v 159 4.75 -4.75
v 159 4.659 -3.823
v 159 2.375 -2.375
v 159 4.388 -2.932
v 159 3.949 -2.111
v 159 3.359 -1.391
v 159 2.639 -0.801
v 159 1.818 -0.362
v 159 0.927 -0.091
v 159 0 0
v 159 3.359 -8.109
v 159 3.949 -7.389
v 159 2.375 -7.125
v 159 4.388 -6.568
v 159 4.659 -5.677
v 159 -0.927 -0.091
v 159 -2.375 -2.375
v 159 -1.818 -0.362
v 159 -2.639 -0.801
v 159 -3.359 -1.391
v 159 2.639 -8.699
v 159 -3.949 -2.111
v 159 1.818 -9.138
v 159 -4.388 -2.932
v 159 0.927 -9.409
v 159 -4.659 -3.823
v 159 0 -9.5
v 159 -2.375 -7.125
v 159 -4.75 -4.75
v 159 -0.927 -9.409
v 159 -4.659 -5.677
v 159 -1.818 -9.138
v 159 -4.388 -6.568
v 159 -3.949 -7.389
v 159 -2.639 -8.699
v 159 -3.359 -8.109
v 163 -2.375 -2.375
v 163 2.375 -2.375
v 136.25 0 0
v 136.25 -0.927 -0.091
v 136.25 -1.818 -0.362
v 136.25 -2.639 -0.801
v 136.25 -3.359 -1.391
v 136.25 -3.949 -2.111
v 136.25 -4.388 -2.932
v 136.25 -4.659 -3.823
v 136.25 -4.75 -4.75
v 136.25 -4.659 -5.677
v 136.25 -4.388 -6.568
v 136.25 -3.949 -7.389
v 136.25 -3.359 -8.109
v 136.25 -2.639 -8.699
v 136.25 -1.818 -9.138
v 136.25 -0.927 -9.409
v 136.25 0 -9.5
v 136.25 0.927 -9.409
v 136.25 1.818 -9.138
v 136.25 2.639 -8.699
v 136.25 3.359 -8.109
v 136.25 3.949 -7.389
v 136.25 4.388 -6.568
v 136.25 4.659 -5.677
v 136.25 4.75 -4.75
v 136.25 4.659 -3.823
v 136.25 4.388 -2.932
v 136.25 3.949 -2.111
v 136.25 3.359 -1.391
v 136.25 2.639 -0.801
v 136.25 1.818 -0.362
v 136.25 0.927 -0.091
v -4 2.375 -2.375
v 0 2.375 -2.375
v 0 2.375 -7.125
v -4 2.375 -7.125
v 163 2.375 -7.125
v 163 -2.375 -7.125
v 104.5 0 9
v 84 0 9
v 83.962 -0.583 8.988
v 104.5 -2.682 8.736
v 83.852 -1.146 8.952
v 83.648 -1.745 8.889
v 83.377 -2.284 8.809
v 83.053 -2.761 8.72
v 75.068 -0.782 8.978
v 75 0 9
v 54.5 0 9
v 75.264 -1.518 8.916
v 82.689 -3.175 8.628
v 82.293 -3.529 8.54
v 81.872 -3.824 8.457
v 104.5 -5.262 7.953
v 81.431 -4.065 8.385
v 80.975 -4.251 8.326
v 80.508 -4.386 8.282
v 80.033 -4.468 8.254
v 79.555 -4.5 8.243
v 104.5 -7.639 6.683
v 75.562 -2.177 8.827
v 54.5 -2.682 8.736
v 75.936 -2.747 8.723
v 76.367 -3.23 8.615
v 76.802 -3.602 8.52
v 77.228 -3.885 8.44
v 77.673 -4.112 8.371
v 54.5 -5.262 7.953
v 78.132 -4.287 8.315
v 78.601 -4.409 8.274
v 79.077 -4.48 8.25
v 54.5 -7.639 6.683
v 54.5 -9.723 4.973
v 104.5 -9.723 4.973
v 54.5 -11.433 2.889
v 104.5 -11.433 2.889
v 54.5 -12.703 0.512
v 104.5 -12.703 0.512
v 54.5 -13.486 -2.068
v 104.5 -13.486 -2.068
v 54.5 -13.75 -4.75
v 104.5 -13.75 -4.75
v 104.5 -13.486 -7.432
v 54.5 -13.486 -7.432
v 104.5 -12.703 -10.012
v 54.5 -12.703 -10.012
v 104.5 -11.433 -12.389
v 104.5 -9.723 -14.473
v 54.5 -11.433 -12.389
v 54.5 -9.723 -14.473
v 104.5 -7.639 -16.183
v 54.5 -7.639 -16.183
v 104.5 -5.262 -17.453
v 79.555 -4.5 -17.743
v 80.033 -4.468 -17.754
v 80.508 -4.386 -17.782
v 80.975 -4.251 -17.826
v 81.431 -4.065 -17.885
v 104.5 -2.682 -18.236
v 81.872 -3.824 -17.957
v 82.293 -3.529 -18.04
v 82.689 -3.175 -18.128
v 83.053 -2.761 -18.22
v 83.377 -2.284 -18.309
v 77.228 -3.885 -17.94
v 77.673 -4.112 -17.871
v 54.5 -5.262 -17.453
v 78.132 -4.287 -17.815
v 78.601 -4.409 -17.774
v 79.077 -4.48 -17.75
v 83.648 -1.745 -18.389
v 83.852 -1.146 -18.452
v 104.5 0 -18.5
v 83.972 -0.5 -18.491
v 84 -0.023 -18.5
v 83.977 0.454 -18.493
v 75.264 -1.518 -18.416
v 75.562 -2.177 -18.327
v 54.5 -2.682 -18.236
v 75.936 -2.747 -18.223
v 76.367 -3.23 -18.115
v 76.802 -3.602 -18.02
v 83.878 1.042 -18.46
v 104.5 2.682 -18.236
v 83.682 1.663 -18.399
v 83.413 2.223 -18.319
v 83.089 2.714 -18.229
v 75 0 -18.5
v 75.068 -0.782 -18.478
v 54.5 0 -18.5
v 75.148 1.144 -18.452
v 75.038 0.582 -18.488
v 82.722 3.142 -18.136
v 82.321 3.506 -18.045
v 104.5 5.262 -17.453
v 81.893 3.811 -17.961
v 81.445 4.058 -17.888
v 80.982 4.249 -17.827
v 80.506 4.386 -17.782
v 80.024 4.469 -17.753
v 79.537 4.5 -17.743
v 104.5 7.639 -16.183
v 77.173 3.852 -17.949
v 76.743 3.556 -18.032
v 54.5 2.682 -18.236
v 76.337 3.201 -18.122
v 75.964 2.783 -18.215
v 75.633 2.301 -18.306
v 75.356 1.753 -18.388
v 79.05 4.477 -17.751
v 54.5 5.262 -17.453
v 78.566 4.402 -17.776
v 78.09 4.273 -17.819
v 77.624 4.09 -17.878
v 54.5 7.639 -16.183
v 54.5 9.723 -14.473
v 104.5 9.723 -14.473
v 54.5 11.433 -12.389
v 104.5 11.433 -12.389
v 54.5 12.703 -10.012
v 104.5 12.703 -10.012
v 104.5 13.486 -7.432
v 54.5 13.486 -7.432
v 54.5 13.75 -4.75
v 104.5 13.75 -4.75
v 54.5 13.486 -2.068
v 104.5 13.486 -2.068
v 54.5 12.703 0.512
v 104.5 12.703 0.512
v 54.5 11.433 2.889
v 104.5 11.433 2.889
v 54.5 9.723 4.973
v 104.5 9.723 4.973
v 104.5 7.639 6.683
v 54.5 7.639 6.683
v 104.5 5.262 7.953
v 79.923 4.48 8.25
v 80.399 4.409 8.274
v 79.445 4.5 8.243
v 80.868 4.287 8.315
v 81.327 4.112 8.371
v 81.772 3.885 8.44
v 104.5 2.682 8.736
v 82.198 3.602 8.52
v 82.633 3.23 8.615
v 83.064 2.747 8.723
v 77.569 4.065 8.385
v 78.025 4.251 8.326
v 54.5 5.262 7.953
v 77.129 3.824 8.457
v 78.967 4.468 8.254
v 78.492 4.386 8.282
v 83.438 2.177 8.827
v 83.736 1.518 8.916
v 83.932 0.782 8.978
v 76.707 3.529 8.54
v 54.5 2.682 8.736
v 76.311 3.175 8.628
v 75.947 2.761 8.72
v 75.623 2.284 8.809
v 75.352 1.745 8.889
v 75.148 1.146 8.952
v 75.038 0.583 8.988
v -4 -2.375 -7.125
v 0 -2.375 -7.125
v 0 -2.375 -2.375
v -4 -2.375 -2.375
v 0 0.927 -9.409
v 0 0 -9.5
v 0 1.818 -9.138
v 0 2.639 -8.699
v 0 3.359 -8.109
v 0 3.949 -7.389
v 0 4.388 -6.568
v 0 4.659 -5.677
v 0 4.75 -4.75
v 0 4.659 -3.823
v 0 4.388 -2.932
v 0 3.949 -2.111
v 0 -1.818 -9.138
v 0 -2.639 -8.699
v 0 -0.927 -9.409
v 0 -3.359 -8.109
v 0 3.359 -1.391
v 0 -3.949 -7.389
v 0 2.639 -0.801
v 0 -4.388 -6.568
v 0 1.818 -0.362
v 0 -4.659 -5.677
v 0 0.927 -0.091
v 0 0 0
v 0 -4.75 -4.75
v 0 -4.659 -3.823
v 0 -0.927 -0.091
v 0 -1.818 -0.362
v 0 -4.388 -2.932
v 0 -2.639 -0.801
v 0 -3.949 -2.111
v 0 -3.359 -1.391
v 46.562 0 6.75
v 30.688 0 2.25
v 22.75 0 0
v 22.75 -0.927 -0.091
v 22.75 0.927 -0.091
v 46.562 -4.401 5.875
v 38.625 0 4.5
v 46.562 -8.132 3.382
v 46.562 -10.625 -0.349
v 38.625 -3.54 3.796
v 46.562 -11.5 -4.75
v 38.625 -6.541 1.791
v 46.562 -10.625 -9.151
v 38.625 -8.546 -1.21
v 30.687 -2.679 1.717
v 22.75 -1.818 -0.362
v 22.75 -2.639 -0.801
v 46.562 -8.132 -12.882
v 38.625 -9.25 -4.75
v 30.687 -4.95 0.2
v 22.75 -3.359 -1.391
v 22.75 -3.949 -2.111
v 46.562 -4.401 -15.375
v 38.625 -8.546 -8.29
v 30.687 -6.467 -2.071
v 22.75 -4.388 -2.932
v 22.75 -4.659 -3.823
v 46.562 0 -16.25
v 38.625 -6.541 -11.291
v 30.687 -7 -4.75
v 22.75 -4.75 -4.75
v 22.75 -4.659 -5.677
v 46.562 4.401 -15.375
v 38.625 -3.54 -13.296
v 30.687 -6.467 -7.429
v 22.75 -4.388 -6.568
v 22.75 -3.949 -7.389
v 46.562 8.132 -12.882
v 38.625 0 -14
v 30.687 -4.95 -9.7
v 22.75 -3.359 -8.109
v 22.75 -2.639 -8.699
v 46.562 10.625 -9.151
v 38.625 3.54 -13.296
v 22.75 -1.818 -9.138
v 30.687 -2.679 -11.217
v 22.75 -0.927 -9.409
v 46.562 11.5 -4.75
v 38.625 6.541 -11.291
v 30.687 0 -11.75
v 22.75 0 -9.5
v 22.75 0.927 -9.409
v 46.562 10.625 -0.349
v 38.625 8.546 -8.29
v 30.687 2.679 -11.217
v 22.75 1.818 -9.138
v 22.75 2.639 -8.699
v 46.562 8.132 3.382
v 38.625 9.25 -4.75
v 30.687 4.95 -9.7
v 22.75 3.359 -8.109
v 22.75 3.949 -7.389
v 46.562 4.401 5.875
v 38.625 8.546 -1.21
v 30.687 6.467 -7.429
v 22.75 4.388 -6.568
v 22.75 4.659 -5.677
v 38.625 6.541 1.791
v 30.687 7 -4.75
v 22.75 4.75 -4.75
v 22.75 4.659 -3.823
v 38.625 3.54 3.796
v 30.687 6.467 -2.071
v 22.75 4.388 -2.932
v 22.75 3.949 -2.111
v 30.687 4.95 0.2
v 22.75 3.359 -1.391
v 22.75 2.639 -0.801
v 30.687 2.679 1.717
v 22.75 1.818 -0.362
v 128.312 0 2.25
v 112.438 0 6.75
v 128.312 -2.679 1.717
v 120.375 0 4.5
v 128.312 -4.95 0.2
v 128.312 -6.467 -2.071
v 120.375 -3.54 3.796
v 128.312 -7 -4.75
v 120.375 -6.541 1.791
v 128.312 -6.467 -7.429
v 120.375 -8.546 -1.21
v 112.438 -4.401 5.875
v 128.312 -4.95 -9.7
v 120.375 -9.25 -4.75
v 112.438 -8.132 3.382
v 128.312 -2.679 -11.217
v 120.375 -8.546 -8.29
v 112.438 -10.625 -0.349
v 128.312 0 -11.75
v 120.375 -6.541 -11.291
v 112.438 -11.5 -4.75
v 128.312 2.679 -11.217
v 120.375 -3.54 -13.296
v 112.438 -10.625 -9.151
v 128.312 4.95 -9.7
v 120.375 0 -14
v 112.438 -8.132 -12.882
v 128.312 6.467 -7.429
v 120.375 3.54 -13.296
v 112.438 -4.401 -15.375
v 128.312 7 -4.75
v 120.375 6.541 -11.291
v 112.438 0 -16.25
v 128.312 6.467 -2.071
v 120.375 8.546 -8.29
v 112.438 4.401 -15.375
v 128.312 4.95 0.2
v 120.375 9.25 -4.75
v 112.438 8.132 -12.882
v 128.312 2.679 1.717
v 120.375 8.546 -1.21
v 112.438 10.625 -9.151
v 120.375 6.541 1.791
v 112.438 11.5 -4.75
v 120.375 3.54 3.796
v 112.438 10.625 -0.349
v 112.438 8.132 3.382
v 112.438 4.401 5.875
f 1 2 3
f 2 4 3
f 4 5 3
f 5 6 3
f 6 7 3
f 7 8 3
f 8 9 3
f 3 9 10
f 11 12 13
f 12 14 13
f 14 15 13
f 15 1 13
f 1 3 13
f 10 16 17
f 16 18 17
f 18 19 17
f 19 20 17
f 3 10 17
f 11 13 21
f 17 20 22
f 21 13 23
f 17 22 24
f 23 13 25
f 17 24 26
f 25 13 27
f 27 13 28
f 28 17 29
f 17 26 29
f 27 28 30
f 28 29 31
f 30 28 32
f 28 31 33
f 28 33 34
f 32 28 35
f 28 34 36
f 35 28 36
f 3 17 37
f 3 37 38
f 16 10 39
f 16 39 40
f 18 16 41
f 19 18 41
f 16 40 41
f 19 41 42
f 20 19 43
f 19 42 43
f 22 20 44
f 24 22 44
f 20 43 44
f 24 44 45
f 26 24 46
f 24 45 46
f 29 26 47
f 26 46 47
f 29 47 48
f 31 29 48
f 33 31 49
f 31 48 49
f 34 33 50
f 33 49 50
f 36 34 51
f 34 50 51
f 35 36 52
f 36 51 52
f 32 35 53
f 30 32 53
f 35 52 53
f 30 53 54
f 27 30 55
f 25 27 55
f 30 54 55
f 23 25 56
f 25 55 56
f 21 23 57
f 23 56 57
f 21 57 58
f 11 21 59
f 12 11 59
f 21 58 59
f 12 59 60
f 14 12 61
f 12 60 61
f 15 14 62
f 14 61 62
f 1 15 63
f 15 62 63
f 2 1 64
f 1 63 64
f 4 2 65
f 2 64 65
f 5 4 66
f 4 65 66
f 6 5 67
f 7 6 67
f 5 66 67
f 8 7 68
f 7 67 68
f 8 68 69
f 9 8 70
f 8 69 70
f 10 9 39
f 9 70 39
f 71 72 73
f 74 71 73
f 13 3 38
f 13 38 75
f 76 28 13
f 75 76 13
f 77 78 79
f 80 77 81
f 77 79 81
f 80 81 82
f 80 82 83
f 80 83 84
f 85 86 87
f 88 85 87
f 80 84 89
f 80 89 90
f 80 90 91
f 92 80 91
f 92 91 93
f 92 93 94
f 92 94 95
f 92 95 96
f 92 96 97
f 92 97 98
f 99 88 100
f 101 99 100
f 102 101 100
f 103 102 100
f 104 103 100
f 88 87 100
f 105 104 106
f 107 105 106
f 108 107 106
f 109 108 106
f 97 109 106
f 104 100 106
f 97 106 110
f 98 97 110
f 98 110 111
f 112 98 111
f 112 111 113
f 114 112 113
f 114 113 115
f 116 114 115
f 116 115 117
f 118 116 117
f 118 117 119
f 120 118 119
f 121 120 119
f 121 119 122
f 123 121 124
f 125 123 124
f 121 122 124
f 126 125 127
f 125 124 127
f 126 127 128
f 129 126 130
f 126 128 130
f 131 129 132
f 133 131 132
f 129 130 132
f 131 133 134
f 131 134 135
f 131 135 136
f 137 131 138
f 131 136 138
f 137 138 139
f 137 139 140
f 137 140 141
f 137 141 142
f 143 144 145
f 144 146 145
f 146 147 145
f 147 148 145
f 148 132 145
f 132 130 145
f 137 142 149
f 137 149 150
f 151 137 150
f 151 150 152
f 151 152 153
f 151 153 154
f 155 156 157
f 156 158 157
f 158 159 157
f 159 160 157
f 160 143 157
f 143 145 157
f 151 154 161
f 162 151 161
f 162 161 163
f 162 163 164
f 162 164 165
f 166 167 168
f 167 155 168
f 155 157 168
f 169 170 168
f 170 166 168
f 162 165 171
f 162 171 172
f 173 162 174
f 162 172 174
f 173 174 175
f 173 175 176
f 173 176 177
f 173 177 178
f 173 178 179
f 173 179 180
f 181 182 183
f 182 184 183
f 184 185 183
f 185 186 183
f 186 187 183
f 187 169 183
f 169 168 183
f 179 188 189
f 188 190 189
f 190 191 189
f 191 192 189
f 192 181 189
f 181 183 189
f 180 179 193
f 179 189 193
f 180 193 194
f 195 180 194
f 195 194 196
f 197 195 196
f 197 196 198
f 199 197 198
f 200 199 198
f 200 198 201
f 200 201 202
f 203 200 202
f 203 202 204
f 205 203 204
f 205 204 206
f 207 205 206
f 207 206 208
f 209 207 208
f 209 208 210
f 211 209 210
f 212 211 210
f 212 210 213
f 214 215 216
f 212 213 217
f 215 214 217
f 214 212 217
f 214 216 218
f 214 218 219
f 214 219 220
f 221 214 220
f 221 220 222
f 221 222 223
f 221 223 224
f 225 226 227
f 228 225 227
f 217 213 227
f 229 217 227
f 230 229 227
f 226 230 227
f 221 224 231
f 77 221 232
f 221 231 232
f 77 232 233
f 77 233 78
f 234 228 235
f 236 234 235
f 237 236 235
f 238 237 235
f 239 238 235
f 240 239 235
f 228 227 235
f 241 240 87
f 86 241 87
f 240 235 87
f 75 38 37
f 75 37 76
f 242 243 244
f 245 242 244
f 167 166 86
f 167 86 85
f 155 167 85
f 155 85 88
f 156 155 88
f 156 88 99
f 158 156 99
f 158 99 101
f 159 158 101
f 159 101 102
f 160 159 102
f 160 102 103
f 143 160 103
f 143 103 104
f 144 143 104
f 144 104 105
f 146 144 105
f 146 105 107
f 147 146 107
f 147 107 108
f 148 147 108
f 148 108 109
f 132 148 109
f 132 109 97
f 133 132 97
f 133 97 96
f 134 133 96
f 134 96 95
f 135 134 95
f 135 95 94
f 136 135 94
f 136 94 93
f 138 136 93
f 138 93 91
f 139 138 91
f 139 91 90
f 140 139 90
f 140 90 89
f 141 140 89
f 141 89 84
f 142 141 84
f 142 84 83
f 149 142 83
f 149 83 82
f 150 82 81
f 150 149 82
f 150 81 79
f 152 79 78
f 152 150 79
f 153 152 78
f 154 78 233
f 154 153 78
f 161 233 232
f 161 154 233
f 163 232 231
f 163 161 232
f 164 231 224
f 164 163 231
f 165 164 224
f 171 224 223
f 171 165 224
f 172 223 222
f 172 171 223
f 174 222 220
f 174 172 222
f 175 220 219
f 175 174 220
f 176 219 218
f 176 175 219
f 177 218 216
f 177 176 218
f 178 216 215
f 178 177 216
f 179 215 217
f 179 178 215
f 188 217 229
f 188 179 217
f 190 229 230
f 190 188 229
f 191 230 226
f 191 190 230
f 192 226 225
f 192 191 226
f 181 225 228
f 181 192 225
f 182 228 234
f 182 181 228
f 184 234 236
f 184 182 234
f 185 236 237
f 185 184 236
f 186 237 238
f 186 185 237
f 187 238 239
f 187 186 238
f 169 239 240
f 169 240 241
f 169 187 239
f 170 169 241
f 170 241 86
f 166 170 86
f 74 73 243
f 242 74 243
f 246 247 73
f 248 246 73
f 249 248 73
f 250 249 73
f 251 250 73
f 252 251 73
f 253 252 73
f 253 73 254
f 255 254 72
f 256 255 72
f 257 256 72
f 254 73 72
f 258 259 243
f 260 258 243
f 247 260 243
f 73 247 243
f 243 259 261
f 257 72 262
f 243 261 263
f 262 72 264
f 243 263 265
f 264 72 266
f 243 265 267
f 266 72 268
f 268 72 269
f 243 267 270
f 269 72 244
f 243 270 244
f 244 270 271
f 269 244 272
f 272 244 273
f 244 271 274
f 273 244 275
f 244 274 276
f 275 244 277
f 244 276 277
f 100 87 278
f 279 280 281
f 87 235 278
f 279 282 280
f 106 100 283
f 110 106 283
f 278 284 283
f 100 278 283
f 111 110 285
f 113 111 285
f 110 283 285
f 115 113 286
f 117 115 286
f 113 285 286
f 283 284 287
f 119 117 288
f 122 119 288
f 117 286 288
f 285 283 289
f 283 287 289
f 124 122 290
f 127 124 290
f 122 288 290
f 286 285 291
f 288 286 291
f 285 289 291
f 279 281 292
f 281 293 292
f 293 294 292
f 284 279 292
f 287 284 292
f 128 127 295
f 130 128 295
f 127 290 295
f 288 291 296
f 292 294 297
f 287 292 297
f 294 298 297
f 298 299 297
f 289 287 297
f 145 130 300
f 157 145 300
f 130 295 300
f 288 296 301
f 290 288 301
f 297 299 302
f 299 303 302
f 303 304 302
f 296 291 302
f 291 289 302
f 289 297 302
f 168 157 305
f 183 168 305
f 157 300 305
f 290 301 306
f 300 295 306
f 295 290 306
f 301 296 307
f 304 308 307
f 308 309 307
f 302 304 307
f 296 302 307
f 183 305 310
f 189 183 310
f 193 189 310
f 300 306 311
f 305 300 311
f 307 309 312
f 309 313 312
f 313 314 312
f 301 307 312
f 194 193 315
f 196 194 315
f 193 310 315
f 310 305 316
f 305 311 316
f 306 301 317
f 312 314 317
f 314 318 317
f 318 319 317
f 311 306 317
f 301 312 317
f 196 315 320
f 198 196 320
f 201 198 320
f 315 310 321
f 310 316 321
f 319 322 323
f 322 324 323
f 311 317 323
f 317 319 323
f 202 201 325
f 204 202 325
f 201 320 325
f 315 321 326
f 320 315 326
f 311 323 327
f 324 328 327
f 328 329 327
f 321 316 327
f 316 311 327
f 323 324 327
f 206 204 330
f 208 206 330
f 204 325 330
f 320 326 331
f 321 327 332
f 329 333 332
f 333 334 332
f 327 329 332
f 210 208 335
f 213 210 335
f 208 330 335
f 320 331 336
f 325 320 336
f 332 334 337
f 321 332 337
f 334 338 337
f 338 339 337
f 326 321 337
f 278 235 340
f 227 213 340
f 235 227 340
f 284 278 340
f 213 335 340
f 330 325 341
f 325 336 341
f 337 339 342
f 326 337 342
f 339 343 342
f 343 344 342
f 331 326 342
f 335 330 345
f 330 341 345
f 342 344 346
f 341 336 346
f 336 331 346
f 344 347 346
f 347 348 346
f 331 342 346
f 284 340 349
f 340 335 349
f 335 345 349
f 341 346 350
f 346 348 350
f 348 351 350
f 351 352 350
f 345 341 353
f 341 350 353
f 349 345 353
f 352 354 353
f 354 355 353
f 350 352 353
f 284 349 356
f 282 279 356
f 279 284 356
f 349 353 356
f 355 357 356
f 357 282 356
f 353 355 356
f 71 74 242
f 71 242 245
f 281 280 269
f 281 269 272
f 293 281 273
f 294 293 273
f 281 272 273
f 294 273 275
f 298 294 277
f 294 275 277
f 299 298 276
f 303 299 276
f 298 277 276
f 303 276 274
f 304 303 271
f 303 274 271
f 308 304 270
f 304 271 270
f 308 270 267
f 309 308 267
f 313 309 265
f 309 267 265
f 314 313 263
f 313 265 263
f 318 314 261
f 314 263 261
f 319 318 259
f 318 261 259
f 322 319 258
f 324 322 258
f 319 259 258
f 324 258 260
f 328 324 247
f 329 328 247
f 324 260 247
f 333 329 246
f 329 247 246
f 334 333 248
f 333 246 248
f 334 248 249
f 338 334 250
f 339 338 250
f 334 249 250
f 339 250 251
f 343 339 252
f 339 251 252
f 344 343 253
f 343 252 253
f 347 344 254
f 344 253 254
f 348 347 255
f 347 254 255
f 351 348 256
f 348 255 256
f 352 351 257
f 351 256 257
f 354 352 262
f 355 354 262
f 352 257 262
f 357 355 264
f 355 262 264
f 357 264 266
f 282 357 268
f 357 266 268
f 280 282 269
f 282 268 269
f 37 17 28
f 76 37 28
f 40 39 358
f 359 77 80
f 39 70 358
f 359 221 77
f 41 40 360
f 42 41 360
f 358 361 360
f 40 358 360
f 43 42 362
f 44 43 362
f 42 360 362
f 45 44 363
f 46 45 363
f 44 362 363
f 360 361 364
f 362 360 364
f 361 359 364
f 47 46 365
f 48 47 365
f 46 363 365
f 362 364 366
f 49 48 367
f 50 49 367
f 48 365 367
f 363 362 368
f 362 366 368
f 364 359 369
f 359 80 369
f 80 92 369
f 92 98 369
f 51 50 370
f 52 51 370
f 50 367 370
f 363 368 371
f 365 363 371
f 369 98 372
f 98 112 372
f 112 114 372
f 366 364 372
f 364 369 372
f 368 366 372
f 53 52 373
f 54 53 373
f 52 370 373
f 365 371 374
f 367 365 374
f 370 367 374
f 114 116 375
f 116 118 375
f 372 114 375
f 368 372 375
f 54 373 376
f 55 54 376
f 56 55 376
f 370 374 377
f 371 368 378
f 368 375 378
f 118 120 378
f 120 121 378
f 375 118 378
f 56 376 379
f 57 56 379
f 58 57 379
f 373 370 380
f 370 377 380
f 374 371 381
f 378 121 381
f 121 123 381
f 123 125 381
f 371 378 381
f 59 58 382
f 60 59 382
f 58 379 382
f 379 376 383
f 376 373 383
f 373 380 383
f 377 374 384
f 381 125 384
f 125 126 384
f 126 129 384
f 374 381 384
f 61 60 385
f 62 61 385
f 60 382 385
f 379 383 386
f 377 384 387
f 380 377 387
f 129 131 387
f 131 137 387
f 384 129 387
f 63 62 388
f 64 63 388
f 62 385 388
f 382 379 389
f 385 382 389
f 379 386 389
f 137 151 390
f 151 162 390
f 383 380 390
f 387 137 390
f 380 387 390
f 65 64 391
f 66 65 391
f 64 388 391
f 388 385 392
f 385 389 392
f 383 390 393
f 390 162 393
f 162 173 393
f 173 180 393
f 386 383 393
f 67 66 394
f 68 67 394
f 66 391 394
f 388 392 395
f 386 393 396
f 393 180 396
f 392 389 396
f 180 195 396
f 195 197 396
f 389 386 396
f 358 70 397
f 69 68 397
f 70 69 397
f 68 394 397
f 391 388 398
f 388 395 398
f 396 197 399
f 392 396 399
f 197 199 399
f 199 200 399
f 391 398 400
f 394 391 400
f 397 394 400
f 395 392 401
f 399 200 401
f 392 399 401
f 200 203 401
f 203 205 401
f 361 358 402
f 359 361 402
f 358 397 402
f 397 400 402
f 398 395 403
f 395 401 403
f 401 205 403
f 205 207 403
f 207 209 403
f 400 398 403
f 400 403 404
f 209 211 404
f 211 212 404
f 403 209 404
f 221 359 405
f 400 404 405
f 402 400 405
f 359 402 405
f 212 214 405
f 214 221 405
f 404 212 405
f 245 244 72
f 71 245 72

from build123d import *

# Parameters (mm, degrees)
ESQUISSE5_W                  = 4.75
ESQUISSE5_H                  = 4.75
BOSS_EXTRU_3_DEPTH           = 4
BOSS_EXTRU_4_DEPTH           = 4
ENL_V_MAT_EXTRU_1_DEPTH      = 40
ENL_V_MAT_EXTRU_1_DEPTH_BACK = 30
ESQUISSE7_R                  = 4.5


with BuildPart() as part:
    # Esquisse1 → Révolution1 (revolve)
    with BuildSketch(Plane(origin=(0, 0, 0), x_dir=(1, 0, 0), z_dir=(0, 1, 0))):
        Polygon((0, 0), (0, 4.75), (159, 4.75), (159, 0), (136.25, 0), (104.5, -9), (54.5, -9), (22.75, 0), align=None)
    revolve(axis=Axis((0, 0, -4.75), (1, 0, 0)))

    # Esquisse5 → Boss.-Extru.3 (add)
    with BuildSketch(Plane(origin=(159, 0, 0), x_dir=(0, 0, -1), z_dir=(1, 0, 0))):
        with Locations((4.75, 0)):
            Rectangle(ESQUISSE5_W, ESQUISSE5_H)
    extrude(amount=BOSS_EXTRU_3_DEPTH)

    # Esquisse6 → Boss.-Extru.4 (add)
    with BuildSketch(Plane.ZY):
        Polygon((-4.75, 2.375), (-7.125, 2.375), (-7.125, -2.375), (-2.375, -2.375), (-2.375, 2.375), align=None)
    extrude(amount=BOSS_EXTRU_4_DEPTH)

    # Esquisse7 → Enlèv. mat.-Extru.1 (cut, two sides: drawn at the far end of the back side and taken through both)
    with BuildSketch(Plane.XY.offset(-2.375).offset(-ENL_V_MAT_EXTRU_1_DEPTH_BACK)):
        with Locations(Location((79.5, 0, 0), (0, 0, 179.999999999))):
            Circle(ESQUISSE7_R)
    extrude(amount=ENL_V_MAT_EXTRU_1_DEPTH + ENL_V_MAT_EXTRU_1_DEPTH_BACK, mode=Mode.SUBTRACT)


solid = part.part
